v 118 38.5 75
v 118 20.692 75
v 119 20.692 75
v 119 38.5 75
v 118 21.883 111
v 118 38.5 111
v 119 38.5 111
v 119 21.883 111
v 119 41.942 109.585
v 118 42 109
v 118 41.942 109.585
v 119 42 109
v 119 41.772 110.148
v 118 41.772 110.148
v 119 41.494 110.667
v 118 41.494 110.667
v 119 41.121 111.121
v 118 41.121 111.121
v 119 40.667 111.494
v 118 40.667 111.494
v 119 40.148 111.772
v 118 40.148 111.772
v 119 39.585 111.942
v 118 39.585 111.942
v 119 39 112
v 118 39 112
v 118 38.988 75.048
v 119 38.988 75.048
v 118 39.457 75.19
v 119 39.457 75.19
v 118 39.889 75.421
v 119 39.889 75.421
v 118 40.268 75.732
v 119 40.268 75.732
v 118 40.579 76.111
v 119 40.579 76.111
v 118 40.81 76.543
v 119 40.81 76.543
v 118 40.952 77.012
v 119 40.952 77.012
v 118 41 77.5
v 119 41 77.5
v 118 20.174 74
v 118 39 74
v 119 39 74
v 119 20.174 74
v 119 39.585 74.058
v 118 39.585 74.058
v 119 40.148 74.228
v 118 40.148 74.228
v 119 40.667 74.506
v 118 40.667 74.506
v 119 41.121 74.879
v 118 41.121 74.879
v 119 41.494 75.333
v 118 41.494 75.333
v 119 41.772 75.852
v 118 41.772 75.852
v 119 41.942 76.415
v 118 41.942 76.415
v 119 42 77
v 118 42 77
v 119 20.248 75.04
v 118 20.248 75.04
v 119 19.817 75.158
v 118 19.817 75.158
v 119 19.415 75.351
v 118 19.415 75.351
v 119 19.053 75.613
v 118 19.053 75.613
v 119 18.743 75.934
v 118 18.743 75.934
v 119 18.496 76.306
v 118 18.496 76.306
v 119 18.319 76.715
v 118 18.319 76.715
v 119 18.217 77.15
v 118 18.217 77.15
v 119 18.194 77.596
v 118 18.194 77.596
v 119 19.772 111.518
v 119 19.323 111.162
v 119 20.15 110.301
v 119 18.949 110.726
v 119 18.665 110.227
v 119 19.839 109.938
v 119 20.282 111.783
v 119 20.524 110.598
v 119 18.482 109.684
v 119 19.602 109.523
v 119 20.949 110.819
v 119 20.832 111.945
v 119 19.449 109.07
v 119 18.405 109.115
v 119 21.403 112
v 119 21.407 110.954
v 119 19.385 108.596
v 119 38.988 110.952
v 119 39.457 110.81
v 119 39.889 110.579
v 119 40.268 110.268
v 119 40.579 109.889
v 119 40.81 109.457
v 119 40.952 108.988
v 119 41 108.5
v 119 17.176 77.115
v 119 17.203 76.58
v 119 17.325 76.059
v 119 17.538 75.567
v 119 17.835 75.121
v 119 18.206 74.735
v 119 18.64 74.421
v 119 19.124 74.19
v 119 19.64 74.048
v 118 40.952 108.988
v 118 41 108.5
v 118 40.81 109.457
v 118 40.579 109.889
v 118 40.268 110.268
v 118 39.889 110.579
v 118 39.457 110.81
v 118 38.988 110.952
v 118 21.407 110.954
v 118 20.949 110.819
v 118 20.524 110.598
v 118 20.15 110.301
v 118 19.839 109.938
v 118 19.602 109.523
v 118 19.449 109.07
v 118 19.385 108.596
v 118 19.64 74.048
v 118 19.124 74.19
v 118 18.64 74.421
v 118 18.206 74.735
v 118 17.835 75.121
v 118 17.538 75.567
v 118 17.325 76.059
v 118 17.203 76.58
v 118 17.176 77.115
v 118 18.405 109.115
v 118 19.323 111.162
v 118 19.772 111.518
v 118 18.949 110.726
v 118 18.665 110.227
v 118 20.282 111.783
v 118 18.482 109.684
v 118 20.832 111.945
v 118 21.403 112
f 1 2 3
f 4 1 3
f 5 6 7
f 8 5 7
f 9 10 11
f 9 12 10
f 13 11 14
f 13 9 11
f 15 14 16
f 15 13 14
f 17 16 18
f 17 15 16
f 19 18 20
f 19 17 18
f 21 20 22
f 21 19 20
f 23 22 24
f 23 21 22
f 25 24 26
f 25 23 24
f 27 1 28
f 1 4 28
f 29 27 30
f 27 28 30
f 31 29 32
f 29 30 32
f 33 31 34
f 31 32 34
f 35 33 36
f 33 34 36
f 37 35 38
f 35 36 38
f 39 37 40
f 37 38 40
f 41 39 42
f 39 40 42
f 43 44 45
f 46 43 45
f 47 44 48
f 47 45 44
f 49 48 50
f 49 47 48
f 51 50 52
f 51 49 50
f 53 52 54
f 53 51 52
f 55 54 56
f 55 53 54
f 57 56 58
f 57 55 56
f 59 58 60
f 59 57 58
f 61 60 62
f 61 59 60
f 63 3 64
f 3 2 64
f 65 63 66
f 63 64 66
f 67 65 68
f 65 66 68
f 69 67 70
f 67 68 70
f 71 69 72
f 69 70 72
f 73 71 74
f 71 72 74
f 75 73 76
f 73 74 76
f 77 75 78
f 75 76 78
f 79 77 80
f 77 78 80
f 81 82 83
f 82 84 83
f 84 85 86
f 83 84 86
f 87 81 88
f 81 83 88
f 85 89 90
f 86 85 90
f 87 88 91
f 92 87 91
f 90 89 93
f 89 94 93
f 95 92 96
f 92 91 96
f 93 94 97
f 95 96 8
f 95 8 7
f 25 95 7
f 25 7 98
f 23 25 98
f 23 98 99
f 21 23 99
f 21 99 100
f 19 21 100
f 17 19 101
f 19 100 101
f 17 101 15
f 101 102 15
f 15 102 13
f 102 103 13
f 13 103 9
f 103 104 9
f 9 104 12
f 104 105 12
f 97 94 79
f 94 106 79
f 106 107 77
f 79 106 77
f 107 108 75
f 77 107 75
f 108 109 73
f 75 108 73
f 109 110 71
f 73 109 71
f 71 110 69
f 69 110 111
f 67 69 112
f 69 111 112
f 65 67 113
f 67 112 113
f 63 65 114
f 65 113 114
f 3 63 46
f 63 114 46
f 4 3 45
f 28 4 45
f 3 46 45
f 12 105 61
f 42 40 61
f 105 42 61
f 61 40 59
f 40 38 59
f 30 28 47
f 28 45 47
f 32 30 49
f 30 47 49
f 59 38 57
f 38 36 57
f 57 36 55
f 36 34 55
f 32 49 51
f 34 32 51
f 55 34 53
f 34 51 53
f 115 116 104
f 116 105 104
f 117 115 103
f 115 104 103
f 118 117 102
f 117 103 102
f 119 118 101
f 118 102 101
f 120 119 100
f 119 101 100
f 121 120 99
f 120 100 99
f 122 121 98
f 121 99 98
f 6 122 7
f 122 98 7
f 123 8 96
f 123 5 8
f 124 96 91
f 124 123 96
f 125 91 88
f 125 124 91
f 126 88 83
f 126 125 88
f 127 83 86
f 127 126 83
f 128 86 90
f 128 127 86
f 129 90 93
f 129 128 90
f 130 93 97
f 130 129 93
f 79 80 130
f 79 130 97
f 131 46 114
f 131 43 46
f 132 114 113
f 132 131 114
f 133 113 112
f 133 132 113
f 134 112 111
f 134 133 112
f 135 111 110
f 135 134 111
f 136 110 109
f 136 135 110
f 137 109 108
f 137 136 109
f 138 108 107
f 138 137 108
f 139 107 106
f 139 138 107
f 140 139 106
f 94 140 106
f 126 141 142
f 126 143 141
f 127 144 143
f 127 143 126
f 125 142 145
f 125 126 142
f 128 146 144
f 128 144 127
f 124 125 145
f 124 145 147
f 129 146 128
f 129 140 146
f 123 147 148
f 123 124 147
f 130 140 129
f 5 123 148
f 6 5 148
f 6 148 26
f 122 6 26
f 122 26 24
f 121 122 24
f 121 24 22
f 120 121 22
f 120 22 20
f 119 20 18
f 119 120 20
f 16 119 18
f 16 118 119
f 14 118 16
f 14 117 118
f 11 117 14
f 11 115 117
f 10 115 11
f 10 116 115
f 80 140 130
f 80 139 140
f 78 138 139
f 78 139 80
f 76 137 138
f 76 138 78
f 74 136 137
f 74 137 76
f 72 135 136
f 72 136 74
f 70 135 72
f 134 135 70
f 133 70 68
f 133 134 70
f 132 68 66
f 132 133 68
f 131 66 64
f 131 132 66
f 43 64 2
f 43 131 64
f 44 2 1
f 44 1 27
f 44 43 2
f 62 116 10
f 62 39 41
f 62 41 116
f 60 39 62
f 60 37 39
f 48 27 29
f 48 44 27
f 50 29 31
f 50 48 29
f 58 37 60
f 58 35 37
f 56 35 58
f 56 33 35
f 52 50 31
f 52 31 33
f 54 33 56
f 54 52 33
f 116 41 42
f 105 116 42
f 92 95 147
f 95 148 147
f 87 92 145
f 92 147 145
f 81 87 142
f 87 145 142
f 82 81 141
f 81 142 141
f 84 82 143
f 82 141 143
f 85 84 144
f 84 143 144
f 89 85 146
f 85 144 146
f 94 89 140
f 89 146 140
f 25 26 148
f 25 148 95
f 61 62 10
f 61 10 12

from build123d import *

# Parameters (mm, degrees)
BOX055_W          = 5
BOX055_H          = 24
BOX055_DEPTH      = 40
BOX055_ROLL_ANGLE = -2.2
BOX054_W          = 1
BOX054_H          = 23
BOX054_DEPTH      = 36
FILLET061_R       = 2.5
BOX011_W          = 5
BOX011_H          = 24
BOX011_DEPTH      = 40
BOX011_ROLL_ANGLE = -2.2
BOX010_W          = 1
BOX010_H          = 25
BOX010_DEPTH      = 38
FILLET047_R       = 3


with BuildPart() as cube481:
    # Box055 → Box055 (new body)
    with BuildSketch(Plane.XY):
        with Locations((2.5, 12)):
            Rectangle(BOX055_W, BOX055_H)
    extrude(amount=BOX055_DEPTH)


with BuildPart() as cube481_1:
    # Box055 roll: moved
    add(cube481.part.rotate(Axis((0, 0, 0), (1, 0, 0)), BOX055_ROLL_ANGLE))


with BuildPart() as cube481_2:
    # Box055 placement: moved
    add(cube481_1.part.moved(Location((175, -23, -1))))


with BuildPart() as fillet061:
    # Box054 → Box054 (new body)
    with BuildSketch(Plane(origin=(175, 1, 1), x_dir=(1, 0, 0), z_dir=(0, 0, 1))):
        with Locations((0.5, 11.5)):
            Rectangle(BOX054_W, BOX054_H)
    extrude(amount=BOX054_DEPTH)

    # Cut040: cut Cube481
    add(cube481_2.part, mode=Mode.SUBTRACT)


with BuildPart() as fillet061_1:
    # Cut040 placement: moved
    add(fillet061.part.moved(Location((-57, 17, 74))))

    # Fillet061
    fillet061_edges = [fillet061_1.edges().sort_by_distance(p)[0] for p in [
        (118.5, 41, 111),
        (118.5, 19.477516, 111),
        (118.5, 41, 75),
        (118.5, 18.094535, 75),
    ]]
    fillet(fillet061_edges, radius=FILLET061_R)


with BuildPart() as cube379:
    # Box011 → Box011 (new body)
    with BuildSketch(Plane.XY):
        with Locations((2.5, 12)):
            Rectangle(BOX011_W, BOX011_H)
    extrude(amount=BOX011_DEPTH)


with BuildPart() as cube379_1:
    # Box011 roll: moved
    add(cube379.part.rotate(Axis((0, 0, 0), (1, 0, 0)), BOX011_ROLL_ANGLE))


with BuildPart() as cube379_2:
    # Box011 placement: moved
    add(cube379_1.part.moved(Location((175, -24, -1))))


with BuildPart() as cut041:
    # Box010 → Box010 (new body)
    with BuildSketch(Plane(origin=(175, 0, 0), x_dir=(1, 0, 0), z_dir=(0, 0, 1))):
        with Locations((0.5, 12.5)):
            Rectangle(BOX010_W, BOX010_H)
    extrude(amount=BOX010_DEPTH)

    # Cut004: cut Cube379
    add(cube379_2.part, mode=Mode.SUBTRACT)


with BuildPart() as cut041_1:
    # Cut004 placement: moved
    add(cut041.part.moved(Location((-57, 17, 74))))

    # Fillet047
    fillet047_edges = [cut041_1.edges().sort_by_distance(p)[0] for p in [
        (118.5, 42, 112),
        (118.5, 18.515932, 112),
        (118.5, 42, 74),
        (118.5, 17.056119, 74),
    ]]
    fillet(fillet047_edges, radius=FILLET047_R)

    # Cut041: cut Fillet061
    add(fillet061_1.part, mode=Mode.SUBTRACT)


solid = cut041_1.part
